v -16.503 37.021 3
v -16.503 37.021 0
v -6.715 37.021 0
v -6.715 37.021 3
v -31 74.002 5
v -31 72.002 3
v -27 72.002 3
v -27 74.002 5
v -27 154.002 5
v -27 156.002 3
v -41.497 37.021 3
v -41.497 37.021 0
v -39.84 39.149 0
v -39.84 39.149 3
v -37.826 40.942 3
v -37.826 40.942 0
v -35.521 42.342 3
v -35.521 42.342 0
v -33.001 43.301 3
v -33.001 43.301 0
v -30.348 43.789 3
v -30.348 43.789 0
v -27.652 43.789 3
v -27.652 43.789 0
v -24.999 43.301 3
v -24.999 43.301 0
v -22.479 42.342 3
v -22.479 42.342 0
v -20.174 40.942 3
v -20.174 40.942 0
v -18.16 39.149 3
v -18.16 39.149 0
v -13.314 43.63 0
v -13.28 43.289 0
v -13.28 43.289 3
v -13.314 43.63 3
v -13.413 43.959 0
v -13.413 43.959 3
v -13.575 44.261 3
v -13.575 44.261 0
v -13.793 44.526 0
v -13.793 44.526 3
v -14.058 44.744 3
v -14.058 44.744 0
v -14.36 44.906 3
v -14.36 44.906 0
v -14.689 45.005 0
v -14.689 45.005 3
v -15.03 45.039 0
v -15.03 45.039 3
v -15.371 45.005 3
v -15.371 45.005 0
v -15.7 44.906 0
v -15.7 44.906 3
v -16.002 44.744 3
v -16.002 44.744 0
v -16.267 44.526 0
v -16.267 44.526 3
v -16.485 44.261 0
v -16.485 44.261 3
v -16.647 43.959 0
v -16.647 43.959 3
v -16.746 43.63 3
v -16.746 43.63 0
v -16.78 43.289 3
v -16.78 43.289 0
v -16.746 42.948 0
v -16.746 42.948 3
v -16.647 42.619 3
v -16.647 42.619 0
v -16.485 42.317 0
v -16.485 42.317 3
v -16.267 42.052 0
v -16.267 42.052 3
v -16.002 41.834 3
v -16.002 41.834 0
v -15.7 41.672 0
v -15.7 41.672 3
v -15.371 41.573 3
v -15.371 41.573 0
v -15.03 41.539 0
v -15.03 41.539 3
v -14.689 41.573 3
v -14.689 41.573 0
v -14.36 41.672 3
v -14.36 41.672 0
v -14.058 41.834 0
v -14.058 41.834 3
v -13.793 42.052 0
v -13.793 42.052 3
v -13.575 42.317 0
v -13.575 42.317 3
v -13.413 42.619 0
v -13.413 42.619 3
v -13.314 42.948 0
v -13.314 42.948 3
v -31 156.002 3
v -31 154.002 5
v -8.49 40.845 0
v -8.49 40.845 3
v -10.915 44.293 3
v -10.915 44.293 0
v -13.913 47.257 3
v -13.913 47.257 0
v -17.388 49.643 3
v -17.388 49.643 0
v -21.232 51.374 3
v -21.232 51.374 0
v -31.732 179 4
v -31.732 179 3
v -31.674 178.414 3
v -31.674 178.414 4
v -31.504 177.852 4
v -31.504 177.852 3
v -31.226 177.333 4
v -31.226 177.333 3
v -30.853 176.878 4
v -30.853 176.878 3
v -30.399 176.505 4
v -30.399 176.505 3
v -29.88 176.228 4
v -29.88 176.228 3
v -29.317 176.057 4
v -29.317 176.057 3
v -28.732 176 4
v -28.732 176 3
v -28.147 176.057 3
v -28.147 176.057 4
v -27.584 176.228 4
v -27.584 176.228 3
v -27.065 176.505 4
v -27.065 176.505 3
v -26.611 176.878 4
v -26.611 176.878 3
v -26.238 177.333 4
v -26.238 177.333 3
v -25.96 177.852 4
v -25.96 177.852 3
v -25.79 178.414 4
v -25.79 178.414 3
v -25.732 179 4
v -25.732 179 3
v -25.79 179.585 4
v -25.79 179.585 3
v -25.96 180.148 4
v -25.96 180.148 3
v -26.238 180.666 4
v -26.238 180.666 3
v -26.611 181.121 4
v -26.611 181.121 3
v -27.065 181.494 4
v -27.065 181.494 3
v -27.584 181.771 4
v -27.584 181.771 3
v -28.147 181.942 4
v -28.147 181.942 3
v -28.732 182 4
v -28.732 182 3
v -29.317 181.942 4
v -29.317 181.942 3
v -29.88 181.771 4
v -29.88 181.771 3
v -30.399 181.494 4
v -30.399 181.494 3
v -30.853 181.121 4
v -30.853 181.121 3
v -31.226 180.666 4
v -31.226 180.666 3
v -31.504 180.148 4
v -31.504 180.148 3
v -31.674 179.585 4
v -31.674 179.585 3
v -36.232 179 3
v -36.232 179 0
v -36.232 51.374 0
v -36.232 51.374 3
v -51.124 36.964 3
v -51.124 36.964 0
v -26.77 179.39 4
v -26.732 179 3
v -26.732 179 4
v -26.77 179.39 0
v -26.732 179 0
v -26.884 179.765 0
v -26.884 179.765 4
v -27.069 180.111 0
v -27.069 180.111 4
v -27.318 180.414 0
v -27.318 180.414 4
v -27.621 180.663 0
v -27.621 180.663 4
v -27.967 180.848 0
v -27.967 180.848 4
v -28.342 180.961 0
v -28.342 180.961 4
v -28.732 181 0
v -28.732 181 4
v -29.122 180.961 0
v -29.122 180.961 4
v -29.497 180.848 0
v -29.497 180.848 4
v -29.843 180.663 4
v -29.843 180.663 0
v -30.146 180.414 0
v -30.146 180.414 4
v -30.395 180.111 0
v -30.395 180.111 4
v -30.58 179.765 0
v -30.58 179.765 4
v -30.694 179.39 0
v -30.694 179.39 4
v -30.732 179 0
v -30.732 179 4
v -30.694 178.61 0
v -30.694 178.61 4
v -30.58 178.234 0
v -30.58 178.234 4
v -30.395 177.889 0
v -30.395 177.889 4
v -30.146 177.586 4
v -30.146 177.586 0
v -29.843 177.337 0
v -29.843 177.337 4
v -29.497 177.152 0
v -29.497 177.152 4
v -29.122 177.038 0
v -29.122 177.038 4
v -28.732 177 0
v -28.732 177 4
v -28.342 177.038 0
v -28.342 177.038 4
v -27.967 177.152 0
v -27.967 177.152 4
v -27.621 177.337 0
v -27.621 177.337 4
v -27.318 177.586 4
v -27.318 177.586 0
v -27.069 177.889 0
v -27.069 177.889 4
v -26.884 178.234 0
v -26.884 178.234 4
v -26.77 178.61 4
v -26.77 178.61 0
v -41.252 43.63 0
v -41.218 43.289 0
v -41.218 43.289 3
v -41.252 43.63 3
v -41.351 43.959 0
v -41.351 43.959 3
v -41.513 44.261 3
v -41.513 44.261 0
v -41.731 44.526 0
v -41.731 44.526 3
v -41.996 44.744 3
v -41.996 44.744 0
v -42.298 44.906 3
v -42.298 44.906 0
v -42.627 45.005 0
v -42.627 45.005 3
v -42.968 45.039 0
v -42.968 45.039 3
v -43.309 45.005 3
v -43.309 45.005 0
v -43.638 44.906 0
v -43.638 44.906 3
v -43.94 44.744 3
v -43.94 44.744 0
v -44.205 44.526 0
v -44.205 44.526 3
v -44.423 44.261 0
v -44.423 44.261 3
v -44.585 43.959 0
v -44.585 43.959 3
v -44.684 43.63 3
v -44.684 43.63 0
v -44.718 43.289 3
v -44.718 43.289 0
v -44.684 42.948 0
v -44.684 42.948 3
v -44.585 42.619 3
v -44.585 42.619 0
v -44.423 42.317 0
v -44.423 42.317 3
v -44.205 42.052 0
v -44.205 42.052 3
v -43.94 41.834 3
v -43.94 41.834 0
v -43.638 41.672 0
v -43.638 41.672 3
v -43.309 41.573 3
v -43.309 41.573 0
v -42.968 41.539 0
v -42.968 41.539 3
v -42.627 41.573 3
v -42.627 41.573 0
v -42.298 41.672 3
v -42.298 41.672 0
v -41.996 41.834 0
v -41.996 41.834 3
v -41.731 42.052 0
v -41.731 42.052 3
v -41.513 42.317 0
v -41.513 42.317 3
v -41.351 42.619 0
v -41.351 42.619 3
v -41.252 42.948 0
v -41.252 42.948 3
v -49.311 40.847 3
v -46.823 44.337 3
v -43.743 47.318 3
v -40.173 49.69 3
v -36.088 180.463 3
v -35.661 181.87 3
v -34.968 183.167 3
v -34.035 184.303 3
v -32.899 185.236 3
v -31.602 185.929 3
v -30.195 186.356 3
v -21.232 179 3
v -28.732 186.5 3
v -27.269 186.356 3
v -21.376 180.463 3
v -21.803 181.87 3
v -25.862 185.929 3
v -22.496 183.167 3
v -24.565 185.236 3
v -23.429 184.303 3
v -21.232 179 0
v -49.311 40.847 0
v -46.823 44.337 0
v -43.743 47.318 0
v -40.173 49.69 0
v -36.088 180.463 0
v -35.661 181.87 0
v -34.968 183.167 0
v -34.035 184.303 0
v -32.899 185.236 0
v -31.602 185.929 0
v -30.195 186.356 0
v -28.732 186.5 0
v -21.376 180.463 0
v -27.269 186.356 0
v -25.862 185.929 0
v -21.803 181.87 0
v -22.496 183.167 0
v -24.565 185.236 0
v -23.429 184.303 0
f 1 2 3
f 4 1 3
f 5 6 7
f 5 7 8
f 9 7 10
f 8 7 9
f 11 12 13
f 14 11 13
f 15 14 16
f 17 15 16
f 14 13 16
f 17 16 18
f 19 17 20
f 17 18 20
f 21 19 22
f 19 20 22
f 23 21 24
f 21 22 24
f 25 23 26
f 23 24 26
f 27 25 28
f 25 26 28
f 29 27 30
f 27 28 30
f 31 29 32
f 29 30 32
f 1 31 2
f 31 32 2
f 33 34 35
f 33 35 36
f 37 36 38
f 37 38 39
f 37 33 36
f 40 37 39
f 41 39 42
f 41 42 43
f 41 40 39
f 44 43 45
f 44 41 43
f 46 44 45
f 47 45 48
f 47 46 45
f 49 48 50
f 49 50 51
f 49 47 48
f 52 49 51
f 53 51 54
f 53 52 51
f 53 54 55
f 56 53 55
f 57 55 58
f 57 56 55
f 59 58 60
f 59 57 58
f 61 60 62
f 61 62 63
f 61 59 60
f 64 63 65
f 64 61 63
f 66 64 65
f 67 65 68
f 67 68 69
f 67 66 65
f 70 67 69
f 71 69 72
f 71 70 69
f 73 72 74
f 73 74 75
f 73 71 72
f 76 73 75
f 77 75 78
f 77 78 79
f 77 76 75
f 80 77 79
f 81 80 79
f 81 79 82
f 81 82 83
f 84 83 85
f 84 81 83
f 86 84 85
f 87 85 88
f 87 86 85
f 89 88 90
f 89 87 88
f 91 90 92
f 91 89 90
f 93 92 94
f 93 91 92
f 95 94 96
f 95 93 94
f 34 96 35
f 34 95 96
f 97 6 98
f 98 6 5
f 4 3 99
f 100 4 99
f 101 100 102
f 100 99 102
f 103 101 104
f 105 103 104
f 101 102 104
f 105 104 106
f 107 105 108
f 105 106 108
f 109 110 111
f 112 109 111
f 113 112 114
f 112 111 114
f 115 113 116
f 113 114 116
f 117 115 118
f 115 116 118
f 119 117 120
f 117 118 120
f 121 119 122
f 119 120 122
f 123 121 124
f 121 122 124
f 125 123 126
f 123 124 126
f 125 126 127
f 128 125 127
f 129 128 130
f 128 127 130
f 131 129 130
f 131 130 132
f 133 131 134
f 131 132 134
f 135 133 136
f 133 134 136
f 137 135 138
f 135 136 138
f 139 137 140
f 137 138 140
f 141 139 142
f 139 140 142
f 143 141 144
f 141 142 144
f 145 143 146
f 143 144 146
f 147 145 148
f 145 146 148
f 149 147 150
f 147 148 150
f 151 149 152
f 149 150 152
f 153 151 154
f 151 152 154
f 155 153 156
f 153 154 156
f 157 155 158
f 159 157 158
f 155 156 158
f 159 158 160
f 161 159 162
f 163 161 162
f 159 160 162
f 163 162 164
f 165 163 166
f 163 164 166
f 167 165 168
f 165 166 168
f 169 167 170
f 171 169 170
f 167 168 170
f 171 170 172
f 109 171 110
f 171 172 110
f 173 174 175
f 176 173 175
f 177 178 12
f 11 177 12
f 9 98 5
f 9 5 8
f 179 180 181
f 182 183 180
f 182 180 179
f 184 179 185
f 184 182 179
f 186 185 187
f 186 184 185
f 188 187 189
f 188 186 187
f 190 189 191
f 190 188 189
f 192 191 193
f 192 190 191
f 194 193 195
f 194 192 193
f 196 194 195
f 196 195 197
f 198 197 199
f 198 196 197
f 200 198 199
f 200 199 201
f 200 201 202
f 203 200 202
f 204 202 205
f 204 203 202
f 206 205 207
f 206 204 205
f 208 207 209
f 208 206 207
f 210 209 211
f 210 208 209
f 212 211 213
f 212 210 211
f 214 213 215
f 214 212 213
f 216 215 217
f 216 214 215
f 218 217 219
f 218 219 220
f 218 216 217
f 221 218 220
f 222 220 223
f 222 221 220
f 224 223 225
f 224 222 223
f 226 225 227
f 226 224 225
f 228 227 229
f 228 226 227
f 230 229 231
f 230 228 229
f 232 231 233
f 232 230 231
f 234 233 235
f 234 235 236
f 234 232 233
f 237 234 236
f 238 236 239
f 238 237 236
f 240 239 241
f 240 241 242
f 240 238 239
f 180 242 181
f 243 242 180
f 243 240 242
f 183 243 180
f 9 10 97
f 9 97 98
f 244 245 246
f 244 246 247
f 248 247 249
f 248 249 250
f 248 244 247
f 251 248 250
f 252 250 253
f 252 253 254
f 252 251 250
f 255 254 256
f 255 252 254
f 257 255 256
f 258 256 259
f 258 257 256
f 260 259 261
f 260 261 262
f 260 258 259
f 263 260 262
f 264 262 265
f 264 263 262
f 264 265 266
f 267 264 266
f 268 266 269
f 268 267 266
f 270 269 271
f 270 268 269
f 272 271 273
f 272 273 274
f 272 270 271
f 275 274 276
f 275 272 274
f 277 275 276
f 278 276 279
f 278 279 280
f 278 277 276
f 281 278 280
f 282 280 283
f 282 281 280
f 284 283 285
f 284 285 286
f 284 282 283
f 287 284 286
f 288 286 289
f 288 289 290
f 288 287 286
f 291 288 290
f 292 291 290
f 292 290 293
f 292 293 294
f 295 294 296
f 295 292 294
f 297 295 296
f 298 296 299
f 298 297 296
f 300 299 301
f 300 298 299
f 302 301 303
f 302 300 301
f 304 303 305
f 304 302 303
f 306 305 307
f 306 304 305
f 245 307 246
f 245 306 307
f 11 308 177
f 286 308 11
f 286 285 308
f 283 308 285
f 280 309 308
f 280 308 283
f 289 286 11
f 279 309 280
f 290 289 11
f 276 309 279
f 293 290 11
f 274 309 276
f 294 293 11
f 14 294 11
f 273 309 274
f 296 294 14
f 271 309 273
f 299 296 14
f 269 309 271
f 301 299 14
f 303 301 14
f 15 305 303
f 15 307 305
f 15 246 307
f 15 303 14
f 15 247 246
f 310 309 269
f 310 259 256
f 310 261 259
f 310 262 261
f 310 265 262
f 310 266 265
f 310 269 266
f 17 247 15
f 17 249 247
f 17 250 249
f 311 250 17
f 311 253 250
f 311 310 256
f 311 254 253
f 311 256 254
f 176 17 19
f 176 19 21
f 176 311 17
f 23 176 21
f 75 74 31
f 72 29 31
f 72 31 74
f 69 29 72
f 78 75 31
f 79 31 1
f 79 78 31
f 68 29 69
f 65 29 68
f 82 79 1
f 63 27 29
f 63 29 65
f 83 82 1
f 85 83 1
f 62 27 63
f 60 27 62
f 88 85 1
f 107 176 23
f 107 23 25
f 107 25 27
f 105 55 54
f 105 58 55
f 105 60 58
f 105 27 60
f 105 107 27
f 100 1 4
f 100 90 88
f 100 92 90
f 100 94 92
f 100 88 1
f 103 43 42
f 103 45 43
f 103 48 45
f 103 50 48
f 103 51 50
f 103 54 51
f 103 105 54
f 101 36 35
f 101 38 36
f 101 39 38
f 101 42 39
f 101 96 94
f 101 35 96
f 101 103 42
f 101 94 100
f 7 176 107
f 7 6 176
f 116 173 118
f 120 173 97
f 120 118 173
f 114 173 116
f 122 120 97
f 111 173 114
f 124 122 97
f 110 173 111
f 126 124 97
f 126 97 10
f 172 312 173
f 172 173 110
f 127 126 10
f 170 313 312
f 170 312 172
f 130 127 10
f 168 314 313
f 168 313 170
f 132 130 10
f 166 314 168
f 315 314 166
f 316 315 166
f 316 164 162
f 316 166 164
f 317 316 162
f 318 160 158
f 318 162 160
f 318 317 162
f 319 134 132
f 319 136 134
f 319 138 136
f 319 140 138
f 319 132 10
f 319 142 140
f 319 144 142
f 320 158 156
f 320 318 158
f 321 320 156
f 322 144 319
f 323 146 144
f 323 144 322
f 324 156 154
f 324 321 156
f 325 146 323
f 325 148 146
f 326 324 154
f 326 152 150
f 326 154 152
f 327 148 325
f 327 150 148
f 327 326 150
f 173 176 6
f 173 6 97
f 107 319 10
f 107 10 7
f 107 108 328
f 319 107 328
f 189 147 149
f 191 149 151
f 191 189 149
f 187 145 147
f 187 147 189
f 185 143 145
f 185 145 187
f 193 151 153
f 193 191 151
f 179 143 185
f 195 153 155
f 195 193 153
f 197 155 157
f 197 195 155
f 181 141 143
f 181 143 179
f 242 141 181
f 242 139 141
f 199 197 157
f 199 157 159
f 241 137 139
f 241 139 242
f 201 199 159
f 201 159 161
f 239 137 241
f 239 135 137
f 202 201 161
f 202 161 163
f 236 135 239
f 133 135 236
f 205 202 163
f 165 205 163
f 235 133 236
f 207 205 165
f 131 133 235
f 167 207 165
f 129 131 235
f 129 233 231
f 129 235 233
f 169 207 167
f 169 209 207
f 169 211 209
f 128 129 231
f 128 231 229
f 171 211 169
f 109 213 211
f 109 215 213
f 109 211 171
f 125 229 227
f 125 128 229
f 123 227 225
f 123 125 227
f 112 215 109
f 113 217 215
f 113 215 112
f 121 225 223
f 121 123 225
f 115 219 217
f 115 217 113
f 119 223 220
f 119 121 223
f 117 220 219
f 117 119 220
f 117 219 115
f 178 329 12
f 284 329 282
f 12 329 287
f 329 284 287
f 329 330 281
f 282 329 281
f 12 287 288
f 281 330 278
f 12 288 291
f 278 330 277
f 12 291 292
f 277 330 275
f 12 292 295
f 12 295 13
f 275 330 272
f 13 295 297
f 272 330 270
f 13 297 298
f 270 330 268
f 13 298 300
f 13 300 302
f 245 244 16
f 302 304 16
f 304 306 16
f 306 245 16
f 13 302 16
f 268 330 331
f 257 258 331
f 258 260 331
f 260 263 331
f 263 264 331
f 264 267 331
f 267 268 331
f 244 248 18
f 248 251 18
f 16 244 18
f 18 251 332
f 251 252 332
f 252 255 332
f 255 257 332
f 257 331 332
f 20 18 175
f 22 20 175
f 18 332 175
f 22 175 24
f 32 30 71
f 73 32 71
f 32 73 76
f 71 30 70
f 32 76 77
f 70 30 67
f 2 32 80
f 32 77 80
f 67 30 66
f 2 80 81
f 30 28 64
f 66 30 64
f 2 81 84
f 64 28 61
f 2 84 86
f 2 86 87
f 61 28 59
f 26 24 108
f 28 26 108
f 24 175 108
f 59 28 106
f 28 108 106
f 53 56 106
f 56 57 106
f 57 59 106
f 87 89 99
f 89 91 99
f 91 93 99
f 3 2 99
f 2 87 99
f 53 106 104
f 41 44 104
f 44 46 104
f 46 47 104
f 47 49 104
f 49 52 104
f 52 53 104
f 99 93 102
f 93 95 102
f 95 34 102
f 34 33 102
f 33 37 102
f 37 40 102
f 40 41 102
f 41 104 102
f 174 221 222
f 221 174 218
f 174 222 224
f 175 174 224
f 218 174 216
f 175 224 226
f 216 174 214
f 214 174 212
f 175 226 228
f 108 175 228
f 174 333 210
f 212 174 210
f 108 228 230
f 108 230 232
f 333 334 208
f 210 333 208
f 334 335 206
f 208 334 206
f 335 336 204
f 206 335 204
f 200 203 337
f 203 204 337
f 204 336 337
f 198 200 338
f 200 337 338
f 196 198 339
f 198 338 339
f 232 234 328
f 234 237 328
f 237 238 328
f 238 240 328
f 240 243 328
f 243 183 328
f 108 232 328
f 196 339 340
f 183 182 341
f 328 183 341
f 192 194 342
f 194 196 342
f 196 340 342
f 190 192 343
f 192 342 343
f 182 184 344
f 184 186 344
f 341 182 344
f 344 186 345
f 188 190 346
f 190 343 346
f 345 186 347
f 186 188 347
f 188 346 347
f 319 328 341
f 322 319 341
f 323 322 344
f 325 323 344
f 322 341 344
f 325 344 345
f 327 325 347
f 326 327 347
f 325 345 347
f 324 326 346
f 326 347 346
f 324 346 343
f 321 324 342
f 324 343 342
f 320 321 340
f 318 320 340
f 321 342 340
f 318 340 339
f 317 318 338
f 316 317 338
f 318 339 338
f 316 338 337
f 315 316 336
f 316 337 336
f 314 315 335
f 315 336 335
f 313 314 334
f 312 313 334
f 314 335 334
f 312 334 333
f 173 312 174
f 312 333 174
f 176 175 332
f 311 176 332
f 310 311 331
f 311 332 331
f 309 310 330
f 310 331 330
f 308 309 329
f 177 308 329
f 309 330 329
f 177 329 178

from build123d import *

# Parameters (mm, degrees)
SKETCH1_R           = 1.750000705
SKETCH1_R_2         = 2.000000004
BOSS_EXTRUDE1_DEPTH = 3
SKETCH4_R           = 3
SKETCH4_R_2         = 2
BOSS_EXTRUDE4_DEPTH = 1
SKETCH5_W           = 4
SKETCH5_H           = 100
EXTRUDE_THIN1_DEPTH = 2
CHAMFER1_SIZE       = 10


with BuildPart() as part:
    # Sketch1 → Boss-Extrude1 (new body)
    with BuildSketch(Plane.XY):
        with BuildLine():
            Line((-51.124108856, 36.963592514), (-41.497200727, 37.021376193))
            ThreePointArc((-41.497200727, 37.021376193), (-29.000000097, 43.850000709), (-16.502799466, 37.021376193))
            Line((-16.502799466, 37.021376193), (-6.715362892, 37.021376193))
            ThreePointArc((-6.715362892, 37.021376193), (-12.347919102, 45.842082936), (-21.231959071, 51.374206468))
            Line((-21.231959071, 51.374206468), (-21.231959071, 178.999762083))
            ThreePointArc((-21.231959071, 178.999762083), (-28.731959071, 186.499762083), (-36.231959071, 178.999762083))
            Line((-36.231959071, 178.999762083), (-36.231959071, 51.373953802))
            ThreePointArc((-36.231959071, 51.373953802), (-45.351125633, 45.897802101), (-51.124108856, 36.963592514))
        make_face()
        with Locations((-42.968060821, 43.288996652)):
            Circle(SKETCH1_R, mode=Mode.SUBTRACT)
        with Locations((-15.030000194, 43.288996652)):
            Circle(SKETCH1_R, mode=Mode.SUBTRACT)
        with Locations((-28.731959071, 178.999762083)):
            Circle(SKETCH1_R_2, mode=Mode.SUBTRACT)
    extrude(amount=BOSS_EXTRUDE1_DEPTH)

    # Sketch4 → Boss-Extrude4 (add)
    with BuildSketch(Plane.XY.offset(3)):
        with Locations(Location((-28.731959071, 178.999762083, 0), (0, 0, 180))):
            Circle(SKETCH4_R)
        with Locations((-28.731959071, 178.999762083)):
            Circle(SKETCH4_R_2, mode=Mode.SUBTRACT)
    extrude(amount=BOSS_EXTRUDE4_DEPTH)

    # Sketch5 → Extrude-Thin1 (add)
    with BuildSketch(Plane.XY.offset(3)):
        with Locations((-29.000000097, 114.00215714)):
            Rectangle(SKETCH5_W, SKETCH5_H)
    extrude(amount=EXTRUDE_THIN1_DEPTH)

    # Chamfer1
    # the kernel refuses this chamfer: 10 mm, written as the material it takes off along each edge
    with BuildSketch(Plane(origin=(-1.283170217, 164.00215714, 5), x_dir=(0, 0.0274958766105877, -0.9996219169112968), z_dir=(-1, 0, 0))) as chamfer1_piece_1_section:
        Polygon((CHAMFER1_SIZE * 0.999621916911, CHAMFER1_SIZE * 0.0274958766106), (-CHAMFER1_SIZE * 0.0274958766106, CHAMFER1_SIZE * 0.999621916911), (0, 0), align=None)
    chamfer1_piece_1 = extrude(amount=55.433659759, mode=Mode.PRIVATE)
    chamfer1_piece_1 = split(chamfer1_piece_1, bisect_by=Plane(origin=(-29.000000097, 159.483638622, 3), z_dir=(0, 0, 1)), keep=Keep.TOP, mode=Mode.PRIVATE)
    add(chamfer1_piece_1, mode=Mode.SUBTRACT)
    with BuildSketch(Plane(origin=(-56.716829977, 64.00215714, 5), x_dir=(0, -0.027495876610586317, -0.9996219169112968), z_dir=(1, 0, 0))) as chamfer1_piece_2_section:
        Polygon((CHAMFER1_SIZE * 0.999621916911, CHAMFER1_SIZE * 0.0274958766106), (-CHAMFER1_SIZE * 0.0274958766106, CHAMFER1_SIZE * 0.999621916911), (0, 0), align=None)
    chamfer1_piece_2 = extrude(amount=55.433659759, mode=Mode.PRIVATE)
    chamfer1_piece_2 = split(chamfer1_piece_2, bisect_by=Plane(origin=(-29.000000097, 68.520675659, 3), z_dir=(0, 0, 1)), keep=Keep.TOP, mode=Mode.PRIVATE)
    add(chamfer1_piece_2, mode=Mode.SUBTRACT)


solid = part.part
